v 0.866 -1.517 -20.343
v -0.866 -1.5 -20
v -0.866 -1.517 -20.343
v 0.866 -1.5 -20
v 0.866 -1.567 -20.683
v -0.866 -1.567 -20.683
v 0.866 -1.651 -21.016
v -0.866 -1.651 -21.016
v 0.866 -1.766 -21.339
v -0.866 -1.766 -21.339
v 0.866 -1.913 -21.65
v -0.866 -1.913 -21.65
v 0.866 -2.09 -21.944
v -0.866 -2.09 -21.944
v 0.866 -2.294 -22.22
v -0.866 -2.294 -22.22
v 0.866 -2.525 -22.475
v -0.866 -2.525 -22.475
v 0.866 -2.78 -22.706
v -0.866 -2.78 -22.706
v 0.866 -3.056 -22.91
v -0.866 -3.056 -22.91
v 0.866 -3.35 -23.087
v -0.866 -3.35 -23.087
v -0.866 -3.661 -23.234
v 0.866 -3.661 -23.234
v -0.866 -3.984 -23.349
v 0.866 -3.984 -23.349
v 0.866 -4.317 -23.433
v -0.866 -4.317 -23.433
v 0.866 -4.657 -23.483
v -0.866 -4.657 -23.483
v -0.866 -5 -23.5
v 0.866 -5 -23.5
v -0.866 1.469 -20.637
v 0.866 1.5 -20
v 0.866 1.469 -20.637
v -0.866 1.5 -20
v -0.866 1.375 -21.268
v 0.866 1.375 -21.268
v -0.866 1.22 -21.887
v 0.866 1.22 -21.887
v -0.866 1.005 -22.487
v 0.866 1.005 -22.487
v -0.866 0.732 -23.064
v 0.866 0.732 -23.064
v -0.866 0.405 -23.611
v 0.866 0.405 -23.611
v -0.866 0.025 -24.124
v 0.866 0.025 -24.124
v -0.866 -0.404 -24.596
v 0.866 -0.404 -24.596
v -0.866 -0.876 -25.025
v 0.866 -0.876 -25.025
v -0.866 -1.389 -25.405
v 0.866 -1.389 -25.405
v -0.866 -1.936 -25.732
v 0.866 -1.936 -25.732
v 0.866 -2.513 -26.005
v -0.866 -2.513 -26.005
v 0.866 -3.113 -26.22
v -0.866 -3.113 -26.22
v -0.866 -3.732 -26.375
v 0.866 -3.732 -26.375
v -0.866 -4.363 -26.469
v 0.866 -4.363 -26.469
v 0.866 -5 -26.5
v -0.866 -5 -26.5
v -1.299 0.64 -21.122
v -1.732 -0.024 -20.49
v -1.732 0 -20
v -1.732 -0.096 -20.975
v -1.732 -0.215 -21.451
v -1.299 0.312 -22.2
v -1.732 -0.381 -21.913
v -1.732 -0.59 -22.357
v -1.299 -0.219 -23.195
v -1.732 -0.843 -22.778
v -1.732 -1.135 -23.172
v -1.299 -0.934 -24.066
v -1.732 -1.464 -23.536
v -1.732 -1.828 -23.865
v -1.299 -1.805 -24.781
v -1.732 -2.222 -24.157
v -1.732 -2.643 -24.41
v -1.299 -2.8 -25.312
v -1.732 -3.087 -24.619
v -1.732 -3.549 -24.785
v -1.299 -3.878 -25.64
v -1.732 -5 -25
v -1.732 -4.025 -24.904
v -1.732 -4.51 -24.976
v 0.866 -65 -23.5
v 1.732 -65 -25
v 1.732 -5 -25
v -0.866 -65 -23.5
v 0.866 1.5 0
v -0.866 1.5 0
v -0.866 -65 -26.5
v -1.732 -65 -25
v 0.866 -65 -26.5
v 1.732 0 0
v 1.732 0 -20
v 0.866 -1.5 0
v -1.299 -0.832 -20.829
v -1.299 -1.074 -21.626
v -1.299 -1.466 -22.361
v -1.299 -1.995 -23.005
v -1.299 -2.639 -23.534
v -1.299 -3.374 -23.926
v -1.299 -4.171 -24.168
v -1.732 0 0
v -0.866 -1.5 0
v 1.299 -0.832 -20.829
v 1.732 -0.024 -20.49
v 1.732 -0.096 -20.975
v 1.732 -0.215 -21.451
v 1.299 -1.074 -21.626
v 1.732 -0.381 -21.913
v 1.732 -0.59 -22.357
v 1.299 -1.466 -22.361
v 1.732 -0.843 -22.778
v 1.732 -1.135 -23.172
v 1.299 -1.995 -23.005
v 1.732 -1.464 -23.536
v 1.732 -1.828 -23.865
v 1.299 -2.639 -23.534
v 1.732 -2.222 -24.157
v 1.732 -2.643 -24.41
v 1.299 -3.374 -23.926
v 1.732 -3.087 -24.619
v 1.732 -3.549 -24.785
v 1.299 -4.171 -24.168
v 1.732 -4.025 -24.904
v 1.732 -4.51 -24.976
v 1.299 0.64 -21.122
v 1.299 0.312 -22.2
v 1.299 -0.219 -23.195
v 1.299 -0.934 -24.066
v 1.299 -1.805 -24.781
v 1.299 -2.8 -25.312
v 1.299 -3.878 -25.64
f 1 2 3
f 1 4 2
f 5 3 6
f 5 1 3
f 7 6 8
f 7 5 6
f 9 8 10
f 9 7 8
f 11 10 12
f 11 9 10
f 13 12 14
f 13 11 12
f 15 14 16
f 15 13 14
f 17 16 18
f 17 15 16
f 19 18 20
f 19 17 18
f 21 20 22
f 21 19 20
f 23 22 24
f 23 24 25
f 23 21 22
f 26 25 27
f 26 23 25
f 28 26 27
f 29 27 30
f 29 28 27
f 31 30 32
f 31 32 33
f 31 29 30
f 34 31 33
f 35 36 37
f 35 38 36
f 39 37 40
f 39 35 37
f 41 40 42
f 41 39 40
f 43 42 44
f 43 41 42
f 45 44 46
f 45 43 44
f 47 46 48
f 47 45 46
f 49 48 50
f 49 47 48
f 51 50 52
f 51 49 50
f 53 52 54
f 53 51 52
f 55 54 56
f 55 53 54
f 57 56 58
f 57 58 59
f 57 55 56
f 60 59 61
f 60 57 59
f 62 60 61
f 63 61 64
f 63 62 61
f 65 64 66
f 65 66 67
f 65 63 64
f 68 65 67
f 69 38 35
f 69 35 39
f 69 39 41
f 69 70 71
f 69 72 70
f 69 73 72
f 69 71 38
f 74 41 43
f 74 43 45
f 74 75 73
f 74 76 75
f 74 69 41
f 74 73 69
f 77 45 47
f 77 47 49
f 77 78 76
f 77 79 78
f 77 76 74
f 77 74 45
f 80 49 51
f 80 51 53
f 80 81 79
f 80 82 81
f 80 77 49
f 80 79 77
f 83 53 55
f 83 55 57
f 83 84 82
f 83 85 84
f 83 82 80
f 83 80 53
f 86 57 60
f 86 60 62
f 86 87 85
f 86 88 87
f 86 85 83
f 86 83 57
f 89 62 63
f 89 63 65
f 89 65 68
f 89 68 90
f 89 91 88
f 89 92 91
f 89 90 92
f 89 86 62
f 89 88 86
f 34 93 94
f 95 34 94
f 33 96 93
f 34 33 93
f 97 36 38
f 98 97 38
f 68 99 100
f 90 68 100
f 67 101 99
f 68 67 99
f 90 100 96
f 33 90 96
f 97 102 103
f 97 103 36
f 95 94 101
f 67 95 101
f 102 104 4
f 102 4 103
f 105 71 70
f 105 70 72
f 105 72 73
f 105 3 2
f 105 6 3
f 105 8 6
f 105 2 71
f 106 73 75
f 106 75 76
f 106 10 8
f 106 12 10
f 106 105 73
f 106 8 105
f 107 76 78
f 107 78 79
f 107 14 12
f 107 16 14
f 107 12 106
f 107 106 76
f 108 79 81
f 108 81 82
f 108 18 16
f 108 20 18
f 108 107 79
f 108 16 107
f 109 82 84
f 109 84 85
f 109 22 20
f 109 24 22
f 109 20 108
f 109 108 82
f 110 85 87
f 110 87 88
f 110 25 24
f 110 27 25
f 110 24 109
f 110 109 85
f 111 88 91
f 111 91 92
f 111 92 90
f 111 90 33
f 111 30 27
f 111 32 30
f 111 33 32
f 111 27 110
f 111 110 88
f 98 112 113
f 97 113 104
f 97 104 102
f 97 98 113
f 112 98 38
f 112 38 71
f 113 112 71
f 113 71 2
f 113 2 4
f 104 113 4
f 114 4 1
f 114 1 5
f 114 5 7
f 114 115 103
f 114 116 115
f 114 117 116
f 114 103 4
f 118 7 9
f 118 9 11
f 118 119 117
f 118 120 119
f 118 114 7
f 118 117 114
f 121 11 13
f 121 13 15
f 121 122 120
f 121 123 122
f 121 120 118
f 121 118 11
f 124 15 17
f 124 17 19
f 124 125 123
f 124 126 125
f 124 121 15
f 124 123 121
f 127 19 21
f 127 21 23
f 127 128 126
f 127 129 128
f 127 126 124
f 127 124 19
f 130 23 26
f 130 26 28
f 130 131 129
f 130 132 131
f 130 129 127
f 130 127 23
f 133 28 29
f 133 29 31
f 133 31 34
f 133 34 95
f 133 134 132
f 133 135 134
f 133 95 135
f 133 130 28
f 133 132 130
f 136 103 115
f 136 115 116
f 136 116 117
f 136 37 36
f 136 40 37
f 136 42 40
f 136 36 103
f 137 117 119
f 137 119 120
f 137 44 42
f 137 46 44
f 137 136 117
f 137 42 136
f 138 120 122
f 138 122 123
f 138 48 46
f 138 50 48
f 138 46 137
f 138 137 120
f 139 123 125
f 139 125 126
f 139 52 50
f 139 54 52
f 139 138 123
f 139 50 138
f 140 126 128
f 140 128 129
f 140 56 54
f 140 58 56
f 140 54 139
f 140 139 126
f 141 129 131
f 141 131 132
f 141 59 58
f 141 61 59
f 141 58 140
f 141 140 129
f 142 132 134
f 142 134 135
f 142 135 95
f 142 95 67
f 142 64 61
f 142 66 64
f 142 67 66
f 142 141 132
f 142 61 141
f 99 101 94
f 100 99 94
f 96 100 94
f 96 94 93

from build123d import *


with BuildPart() as part:
    # Süpür1: sweep along a path in Çizim2
    with BuildLine(Plane(origin=(0, 0, 0), x_dir=(0, 0, -1), z_dir=(1, 0, 0))) as s_p_r1_path:
        Line((0, 0), (20, 0))
        ThreePointArc((20, 0), (23.535533906, -1.464466094), (25, -5))
        Line((25, -5), (25, -65))
    # Çizim1 → Süpür1 (sweep)
    with BuildSketch(Plane.XY):
        Polygon((1.732050808, 0), (0.866025404, 1.5), (-0.866025404, 1.5), (-1.732050808, 0), (-0.866025404, -1.5), (0.866025404, -1.5), align=None)
    sweep(path=s_p_r1_path.line)


solid = part.part
